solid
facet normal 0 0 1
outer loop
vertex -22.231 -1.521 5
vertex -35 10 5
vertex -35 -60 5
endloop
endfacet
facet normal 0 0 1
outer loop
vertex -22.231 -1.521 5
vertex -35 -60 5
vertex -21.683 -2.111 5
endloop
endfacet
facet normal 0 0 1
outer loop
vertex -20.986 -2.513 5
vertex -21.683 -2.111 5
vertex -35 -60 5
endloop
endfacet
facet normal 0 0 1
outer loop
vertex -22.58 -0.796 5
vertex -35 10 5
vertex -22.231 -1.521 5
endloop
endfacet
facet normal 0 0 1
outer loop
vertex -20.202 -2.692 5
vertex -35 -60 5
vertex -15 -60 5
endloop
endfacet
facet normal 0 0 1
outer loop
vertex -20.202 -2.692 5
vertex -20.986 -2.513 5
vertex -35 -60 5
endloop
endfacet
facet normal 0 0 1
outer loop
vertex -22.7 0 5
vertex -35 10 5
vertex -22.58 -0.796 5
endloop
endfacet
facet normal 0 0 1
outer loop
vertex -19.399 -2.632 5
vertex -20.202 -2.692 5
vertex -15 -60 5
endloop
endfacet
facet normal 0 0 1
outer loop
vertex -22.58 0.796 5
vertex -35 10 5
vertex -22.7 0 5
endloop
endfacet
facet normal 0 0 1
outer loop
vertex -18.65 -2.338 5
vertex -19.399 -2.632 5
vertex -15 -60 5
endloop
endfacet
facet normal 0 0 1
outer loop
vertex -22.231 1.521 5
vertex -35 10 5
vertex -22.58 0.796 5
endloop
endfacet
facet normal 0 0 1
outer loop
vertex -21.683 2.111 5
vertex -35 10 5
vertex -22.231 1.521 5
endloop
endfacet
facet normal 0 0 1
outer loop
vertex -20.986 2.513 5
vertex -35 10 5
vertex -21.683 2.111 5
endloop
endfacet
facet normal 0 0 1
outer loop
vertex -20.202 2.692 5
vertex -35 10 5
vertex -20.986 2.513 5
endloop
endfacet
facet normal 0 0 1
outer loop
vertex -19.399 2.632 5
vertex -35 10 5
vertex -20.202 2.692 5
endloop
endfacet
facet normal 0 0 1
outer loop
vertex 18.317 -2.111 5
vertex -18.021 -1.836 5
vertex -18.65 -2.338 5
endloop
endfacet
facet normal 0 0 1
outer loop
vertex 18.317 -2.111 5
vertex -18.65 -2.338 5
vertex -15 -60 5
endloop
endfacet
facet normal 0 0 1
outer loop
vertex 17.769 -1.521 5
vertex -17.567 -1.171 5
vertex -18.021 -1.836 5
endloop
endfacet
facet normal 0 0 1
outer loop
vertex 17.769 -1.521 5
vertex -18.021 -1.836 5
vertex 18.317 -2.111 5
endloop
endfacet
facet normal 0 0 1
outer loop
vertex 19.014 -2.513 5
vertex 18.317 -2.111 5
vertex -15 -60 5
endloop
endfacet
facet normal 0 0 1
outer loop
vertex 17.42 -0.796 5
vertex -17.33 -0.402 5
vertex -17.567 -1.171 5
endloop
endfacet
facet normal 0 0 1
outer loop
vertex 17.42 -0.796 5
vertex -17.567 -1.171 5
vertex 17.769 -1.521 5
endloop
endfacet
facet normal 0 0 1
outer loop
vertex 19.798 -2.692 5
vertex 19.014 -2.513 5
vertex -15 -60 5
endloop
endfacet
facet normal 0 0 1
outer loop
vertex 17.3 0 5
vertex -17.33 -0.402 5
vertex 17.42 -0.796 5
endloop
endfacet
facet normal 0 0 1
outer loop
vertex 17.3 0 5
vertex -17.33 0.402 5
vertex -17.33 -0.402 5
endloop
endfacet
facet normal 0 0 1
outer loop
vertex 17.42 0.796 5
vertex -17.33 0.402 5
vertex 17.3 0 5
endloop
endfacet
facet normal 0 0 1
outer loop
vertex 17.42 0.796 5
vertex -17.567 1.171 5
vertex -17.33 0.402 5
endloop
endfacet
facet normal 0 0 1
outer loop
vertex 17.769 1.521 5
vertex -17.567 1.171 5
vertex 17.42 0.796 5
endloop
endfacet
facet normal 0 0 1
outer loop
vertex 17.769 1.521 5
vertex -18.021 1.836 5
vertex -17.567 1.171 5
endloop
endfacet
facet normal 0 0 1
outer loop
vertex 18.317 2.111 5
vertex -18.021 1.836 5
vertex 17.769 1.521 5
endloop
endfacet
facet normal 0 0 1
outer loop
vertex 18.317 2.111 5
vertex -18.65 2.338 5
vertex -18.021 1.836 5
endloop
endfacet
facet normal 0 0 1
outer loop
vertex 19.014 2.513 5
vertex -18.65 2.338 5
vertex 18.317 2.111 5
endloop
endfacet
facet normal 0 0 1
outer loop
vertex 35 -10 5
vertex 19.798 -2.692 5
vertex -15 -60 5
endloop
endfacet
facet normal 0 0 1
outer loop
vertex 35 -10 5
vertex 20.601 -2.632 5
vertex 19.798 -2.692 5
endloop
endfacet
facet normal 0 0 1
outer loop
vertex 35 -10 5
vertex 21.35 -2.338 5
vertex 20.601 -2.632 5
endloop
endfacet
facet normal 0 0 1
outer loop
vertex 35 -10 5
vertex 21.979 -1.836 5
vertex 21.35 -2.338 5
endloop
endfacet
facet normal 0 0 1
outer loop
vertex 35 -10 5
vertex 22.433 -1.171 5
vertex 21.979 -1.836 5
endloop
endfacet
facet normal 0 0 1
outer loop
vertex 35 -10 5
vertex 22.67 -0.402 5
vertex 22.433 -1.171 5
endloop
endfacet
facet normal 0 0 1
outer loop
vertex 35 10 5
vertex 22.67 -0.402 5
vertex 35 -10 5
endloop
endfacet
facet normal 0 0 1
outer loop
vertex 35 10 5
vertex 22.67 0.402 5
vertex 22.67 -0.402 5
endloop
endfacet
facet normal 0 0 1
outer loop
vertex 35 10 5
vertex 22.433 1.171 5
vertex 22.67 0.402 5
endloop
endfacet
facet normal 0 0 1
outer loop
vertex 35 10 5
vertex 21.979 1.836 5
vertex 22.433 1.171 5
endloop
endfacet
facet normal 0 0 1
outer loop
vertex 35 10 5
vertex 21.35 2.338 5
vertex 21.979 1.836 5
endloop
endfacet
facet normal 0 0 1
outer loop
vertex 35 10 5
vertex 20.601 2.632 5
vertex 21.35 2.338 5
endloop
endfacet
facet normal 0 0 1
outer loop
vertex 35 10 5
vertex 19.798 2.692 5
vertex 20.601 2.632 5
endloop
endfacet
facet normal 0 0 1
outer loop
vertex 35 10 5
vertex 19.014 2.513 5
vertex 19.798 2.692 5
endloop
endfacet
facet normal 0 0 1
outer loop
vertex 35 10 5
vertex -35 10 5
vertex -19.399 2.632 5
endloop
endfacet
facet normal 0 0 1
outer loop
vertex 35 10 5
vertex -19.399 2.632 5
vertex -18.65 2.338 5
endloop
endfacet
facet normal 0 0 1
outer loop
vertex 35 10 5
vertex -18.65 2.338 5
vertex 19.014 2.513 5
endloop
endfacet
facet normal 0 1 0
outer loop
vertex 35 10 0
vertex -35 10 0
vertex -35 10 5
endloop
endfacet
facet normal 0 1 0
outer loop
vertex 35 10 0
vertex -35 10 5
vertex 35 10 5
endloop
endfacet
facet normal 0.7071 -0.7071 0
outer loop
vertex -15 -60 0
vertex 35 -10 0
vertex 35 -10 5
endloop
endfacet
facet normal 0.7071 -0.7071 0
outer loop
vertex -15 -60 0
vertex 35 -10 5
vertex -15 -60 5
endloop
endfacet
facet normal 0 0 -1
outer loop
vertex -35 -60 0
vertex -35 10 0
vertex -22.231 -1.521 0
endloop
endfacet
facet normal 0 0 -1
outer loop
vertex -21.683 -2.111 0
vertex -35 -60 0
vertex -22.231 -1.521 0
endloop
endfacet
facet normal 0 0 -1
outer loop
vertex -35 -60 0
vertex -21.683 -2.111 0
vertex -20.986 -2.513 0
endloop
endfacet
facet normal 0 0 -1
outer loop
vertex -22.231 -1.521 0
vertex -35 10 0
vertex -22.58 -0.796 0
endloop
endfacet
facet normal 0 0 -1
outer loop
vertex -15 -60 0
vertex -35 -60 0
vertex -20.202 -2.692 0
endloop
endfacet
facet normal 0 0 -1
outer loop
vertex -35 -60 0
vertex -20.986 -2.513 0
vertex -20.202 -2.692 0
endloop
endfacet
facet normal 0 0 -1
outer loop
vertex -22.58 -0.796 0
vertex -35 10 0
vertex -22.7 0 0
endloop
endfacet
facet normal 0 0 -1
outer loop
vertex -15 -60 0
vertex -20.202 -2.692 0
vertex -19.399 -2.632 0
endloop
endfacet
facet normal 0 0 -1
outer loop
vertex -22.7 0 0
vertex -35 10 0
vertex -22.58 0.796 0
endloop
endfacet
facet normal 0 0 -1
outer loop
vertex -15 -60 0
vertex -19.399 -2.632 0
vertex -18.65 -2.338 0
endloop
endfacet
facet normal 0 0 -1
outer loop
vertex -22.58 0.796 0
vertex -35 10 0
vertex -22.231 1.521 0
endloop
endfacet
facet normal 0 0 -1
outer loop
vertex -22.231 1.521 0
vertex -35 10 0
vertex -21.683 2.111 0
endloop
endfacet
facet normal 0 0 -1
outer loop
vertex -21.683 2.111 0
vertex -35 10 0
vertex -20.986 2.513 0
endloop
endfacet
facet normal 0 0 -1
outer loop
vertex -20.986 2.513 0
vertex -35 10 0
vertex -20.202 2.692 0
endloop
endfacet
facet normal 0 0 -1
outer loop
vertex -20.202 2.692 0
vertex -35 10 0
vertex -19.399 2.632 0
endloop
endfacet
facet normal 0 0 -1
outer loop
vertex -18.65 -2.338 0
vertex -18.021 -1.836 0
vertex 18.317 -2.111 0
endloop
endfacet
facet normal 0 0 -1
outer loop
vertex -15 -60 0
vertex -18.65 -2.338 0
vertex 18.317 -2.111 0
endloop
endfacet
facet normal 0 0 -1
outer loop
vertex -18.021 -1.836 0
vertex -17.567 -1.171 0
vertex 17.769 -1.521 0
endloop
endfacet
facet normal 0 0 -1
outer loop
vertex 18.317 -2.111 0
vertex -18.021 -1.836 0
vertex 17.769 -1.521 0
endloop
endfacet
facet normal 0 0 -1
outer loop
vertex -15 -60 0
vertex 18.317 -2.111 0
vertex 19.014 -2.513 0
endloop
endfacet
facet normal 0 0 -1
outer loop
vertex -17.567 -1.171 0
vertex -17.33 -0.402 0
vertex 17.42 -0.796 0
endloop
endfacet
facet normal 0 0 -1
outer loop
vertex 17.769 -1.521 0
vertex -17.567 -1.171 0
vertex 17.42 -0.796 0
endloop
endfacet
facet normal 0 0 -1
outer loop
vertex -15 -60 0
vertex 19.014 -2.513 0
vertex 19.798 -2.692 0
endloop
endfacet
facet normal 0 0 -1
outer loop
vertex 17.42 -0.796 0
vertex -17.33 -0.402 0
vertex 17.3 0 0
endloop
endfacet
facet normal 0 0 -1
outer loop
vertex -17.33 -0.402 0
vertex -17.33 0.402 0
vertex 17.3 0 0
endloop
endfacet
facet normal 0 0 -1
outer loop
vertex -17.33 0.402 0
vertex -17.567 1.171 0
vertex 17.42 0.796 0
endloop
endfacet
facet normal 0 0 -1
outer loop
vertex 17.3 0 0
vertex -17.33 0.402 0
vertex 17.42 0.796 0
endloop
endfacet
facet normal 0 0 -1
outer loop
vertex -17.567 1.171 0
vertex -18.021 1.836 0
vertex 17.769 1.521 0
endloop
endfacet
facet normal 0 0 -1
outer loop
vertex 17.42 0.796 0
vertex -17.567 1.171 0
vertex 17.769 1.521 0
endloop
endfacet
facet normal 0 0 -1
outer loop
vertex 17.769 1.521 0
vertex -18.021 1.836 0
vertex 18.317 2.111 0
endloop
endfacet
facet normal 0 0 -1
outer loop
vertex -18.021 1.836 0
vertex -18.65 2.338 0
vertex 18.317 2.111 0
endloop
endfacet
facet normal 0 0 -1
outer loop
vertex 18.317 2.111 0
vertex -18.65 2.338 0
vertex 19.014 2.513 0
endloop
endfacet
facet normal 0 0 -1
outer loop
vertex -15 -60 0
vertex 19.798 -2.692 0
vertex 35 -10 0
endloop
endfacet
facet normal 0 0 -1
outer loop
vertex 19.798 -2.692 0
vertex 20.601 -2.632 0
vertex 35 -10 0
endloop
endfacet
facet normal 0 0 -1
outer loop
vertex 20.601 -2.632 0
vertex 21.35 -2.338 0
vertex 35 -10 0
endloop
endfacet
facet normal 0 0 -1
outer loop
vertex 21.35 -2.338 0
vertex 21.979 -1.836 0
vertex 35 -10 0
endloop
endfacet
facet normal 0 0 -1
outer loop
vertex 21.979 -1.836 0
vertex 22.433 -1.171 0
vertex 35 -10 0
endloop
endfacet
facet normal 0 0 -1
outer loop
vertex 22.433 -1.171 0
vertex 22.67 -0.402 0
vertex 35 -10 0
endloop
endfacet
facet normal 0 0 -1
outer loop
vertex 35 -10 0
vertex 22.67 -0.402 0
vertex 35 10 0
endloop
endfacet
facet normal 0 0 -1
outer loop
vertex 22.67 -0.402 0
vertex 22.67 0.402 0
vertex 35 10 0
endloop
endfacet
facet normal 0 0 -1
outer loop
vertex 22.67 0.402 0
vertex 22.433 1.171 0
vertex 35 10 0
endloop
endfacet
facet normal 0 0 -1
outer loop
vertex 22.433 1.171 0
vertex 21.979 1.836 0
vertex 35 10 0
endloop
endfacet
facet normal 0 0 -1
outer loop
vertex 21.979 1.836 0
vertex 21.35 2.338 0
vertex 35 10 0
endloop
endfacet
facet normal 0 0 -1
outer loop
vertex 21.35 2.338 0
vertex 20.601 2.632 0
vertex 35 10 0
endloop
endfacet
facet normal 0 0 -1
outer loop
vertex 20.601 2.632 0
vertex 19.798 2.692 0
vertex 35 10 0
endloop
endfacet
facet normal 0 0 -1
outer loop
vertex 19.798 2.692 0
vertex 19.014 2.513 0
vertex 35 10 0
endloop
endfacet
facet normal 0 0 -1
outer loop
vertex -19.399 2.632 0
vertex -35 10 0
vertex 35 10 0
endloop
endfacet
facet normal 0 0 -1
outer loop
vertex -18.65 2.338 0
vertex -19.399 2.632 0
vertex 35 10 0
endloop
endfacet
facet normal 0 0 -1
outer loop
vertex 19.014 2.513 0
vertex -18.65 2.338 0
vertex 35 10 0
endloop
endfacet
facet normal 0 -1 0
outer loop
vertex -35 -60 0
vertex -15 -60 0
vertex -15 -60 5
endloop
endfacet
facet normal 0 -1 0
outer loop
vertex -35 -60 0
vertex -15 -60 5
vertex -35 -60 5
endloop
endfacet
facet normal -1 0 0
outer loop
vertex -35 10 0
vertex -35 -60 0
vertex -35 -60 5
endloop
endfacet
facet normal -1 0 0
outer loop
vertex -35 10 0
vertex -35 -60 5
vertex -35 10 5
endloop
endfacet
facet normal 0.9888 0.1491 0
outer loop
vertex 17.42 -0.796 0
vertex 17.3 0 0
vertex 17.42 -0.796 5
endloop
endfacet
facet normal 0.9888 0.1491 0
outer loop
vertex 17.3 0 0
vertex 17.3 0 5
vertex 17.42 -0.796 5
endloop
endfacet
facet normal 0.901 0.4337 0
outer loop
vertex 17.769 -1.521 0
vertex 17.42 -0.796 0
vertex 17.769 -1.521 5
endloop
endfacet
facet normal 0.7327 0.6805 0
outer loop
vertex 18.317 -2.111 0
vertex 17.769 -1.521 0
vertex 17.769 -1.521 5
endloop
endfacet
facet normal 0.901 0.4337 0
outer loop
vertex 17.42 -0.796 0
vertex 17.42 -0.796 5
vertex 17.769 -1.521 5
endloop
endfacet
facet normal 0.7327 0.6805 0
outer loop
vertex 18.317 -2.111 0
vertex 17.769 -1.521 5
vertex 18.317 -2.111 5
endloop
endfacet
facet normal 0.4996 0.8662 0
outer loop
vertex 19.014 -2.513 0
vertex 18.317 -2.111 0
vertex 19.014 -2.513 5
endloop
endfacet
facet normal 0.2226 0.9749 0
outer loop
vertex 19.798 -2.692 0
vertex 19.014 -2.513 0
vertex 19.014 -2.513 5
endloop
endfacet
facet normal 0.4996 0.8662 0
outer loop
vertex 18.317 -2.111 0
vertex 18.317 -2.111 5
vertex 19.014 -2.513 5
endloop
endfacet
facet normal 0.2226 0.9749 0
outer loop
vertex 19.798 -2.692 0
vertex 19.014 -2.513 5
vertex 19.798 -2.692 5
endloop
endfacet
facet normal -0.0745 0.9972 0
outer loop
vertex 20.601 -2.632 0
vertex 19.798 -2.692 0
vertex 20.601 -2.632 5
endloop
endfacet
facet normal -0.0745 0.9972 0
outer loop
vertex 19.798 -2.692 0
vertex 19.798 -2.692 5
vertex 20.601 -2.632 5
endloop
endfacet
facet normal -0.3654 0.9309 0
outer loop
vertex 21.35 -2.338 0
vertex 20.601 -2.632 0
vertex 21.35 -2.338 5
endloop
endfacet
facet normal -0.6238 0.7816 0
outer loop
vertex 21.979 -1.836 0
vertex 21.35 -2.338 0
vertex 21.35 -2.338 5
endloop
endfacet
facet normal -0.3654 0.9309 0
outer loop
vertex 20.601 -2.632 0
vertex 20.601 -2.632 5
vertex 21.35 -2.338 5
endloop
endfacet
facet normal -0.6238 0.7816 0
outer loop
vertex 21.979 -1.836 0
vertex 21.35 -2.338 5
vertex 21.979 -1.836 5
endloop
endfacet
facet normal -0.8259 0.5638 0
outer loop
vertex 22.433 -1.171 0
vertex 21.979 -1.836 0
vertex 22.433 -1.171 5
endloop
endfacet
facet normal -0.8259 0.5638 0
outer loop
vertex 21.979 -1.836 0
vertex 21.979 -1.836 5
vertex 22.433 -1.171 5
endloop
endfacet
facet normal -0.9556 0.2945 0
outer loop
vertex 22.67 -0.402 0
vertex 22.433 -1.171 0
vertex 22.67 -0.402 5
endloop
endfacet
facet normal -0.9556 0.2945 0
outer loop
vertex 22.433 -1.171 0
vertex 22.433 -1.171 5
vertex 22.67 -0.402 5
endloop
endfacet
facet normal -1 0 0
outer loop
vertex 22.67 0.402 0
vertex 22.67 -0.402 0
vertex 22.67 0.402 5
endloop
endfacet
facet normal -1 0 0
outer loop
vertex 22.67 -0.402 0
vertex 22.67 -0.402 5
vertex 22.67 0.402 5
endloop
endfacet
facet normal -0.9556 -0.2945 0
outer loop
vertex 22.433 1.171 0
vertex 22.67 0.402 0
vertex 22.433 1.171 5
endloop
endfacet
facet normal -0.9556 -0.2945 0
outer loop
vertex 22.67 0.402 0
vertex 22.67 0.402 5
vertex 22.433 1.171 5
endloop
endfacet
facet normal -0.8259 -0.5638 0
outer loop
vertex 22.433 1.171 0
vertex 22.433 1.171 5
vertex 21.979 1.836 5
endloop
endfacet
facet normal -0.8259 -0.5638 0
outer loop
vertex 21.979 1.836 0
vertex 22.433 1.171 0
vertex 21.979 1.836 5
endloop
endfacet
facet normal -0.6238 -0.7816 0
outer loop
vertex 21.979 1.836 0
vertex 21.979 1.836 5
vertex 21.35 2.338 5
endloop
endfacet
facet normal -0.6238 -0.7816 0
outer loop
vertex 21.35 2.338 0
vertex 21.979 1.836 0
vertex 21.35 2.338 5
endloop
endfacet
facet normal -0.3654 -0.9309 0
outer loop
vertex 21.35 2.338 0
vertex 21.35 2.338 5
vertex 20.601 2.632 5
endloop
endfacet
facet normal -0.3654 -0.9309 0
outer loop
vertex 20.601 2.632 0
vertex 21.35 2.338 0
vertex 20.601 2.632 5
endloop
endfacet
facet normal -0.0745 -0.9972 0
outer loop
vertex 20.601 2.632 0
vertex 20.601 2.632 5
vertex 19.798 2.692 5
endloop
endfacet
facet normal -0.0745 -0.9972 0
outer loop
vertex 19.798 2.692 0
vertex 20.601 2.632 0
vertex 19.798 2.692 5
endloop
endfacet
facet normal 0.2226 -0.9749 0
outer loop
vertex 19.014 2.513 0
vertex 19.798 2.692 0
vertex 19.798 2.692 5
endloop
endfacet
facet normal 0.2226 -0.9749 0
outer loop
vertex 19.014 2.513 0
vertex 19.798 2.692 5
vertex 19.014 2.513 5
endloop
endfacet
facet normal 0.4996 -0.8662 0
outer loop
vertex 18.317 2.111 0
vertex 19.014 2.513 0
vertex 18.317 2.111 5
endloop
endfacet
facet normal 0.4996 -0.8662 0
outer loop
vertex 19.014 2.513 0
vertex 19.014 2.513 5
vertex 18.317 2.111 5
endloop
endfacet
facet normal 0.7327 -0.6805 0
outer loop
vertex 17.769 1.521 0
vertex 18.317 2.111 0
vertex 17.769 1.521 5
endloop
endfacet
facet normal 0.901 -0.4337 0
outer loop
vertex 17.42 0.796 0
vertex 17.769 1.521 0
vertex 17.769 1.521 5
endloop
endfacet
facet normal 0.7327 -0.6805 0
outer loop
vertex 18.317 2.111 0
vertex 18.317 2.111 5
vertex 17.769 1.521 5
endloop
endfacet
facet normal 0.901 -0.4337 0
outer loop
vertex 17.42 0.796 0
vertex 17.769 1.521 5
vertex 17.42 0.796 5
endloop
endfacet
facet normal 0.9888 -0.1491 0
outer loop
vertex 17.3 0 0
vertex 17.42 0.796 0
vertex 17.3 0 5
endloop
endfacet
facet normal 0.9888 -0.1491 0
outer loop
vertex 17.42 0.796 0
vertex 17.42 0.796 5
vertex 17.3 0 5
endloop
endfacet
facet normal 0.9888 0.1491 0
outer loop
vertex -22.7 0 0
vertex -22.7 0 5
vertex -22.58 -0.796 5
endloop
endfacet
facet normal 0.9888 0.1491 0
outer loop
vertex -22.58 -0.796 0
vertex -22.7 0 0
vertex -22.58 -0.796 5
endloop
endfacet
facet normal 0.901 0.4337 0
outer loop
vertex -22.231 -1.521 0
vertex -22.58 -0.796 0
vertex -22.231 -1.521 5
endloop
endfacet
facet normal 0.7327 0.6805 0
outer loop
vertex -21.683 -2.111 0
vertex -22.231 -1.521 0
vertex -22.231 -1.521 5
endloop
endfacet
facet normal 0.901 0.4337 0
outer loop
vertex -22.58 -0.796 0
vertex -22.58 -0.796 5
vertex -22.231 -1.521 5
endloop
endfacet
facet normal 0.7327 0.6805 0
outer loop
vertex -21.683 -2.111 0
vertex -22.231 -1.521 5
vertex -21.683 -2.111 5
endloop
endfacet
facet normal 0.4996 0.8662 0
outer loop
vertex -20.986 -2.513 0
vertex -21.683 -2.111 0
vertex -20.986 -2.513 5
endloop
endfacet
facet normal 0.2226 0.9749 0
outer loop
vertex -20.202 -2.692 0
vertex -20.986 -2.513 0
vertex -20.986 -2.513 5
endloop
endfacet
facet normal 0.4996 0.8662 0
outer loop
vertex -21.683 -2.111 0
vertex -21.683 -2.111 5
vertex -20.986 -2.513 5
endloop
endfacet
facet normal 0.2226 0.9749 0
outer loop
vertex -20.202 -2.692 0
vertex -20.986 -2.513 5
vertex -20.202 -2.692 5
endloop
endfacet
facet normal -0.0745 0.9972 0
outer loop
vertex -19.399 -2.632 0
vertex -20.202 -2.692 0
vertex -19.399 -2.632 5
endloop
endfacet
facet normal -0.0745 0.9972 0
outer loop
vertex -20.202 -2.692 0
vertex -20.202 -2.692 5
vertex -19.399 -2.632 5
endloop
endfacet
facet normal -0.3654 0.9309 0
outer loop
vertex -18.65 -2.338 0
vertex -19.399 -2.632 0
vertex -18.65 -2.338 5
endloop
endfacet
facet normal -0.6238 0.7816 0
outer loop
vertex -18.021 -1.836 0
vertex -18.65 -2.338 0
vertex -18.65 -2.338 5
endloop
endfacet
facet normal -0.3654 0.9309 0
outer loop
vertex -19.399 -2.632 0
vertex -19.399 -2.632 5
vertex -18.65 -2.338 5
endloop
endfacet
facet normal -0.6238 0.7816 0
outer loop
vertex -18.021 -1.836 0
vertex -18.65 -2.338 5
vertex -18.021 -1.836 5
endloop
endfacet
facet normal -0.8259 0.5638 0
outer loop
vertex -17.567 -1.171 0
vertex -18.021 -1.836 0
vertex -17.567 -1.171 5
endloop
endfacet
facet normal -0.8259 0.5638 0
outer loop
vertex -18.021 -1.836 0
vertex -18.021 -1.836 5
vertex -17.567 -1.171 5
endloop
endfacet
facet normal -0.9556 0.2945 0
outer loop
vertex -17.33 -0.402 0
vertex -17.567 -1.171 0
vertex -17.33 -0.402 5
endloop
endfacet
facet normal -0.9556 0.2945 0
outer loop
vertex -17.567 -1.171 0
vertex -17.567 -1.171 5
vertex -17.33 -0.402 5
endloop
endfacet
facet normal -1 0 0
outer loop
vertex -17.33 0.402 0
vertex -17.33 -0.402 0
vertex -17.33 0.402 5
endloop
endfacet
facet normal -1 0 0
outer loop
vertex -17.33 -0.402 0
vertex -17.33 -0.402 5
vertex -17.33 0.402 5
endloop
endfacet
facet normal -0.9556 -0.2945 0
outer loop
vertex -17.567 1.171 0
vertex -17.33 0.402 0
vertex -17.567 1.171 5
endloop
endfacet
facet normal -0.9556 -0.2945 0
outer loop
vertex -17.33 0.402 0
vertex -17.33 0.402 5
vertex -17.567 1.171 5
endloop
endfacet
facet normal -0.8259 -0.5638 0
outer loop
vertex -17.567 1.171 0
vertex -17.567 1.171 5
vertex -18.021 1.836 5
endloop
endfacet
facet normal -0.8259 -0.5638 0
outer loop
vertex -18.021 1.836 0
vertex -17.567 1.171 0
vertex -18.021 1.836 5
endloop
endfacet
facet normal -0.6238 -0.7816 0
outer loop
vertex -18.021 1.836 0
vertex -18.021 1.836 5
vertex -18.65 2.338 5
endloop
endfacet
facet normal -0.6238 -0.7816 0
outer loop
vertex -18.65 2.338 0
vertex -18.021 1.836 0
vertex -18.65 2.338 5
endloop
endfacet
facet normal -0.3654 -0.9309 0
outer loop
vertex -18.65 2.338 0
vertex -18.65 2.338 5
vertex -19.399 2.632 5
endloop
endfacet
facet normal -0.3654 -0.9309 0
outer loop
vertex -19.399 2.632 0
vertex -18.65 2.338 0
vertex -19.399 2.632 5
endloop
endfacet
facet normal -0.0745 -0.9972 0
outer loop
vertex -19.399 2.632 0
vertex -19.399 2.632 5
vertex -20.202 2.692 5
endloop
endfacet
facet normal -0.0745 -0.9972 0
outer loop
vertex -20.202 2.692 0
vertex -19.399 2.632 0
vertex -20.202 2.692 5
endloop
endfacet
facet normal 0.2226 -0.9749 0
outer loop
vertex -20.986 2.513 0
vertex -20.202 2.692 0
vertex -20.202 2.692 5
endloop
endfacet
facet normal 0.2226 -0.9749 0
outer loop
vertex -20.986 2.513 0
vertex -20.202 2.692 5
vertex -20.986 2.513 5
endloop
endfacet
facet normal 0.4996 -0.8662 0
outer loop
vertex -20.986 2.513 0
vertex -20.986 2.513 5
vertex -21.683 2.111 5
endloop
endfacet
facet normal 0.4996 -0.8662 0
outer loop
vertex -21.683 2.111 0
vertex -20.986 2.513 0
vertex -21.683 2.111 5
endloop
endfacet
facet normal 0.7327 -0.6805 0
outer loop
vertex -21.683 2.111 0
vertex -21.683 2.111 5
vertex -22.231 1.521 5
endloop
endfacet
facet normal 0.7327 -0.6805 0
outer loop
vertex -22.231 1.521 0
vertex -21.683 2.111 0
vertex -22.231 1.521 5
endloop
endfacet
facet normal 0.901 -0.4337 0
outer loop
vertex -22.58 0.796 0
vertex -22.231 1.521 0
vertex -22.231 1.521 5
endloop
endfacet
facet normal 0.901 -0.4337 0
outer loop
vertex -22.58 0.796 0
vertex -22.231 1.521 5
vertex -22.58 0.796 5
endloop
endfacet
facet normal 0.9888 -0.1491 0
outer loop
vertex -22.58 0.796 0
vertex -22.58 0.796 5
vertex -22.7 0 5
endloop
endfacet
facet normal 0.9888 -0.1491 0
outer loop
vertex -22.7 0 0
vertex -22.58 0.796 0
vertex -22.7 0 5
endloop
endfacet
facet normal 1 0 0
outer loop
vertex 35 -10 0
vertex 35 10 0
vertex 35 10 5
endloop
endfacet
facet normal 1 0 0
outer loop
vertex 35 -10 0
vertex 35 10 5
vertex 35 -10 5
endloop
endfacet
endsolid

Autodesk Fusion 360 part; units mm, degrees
sketch "Sketch1" plane through (0, 0, 0) normal (0, 0, 1) x (1, 0, 0)
  line L0 (-35, 10) -> (35, 10)
  line L1 (35, 10) -> (35, -10)
  line L2 (35, -10) -> (-15, -60)
  line L3 (-15, -60) -> (-35, -60)
  line L4 (-35, -60) -> (-35, 10)
  point P0 (35, 0)
  point P1 (0, 10)
  dimension "d2" = 50
  dimension "d3" = 20
  dimension "d4" = 45
  dimension "d5" = 20
extrude "Extrude1" add sketch "Sketch1" along normal blind 5
sketch "Sketch2" plane through (0, 0, 5) normal (0, 0, 1) x (-1, 0, 0)
  line L0 (35, 60) -> (15, 60)
  line L1 (15, 60) -> (-35, 10)
  line L2 (-35, 10) -> (-35, -10)
  line L3 (-35, -10) -> (35, -10)
  line L4 (35, -10) -> (35, 60)
  circle A0 centre (-20, 0) radius 2.7
  circle A1 centre (20, 0) radius 2.7
  dimension "d8" = 5.4
  dimension "d9" = 5.4
  dimension "d10" = 20
  dimension "d11" = 20
extrude "Extrude2" cut sketch "Sketch2" against normal blind 10 contours A0 | A1
